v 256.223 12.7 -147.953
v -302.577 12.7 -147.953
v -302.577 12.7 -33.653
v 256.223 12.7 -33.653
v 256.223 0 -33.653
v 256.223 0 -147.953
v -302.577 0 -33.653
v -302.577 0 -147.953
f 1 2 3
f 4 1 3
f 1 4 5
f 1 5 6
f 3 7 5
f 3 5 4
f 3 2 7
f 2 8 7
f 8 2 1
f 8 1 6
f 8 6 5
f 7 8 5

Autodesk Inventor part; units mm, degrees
ref_plane "YZ Plane" through (0, 0, 0) normal (1, 0, 0) x (0, 1, 0)
ref_plane "XZ Plane" through (0, 0, 0) normal (0, 1, 0) x (-1, 0, 0)
ref_plane "XY Plane" through (0, 0, 0) normal (0, 0, 1) x (1, 0, 0)
sketch "Sketch1" plane through (0, 0, 0) normal (0, 1, 0) x (-1, 0, 0)
  line L0 (302.5767, -33.6533) -> (-154.6233, -33.6533)
  line L1 (-154.6233, -33.6533) -> (-154.6233, -147.9533)
  line L2 (-154.6233, -147.9533) -> (302.5767, -147.9533)
  line L3 (302.5767, -147.9533) -> (302.5767, -33.6533)
  line L4 (-154.6233, -147.9533) -> (-205.4233, -147.9533)
  line L5 (-205.4233, -147.9533) -> (-205.4233, -33.6533)
  line L6 (-205.4233, -33.6533) -> (-154.6233, -33.6533)
  line L7 (-154.6233, -33.6533) -> (-154.6233, -147.9533)
  point P0 (0, 0)
  dimension "d0" = 457.2
  dimension "d1" = 114.3
  dimension "d4" = 50.8
extrude "Extrusion1" add sketch "Sketch1" along normal blind 12.7 contours L3 L2 L1 L0
sketch "Sketch2" plane through (154.6233, 0, -33.6533) normal (1, 0, 0) x (0, 0, -1)
  line L0 (0, 12.7) -> (114.3, 12.7) projected
  line L1 (0, 12.7) -> (114.3, 12.7)
  line L2 (114.3, 12.7) -> (114.3, 0)
  line L3 (114.3, 0) -> (0, 0)
  line L4 (0, 0) -> (0, 12.7)
  point P0 (-33.6533, 0)
extrude "Extrusion2" add sketch "Sketch2" along normal blind 50.8
sketch "Sketch3" plane through (205.4233, 0, -33.6533) normal (1, 0, 0) x (0, 0, -1)
  line L0 (114.3, 12.7) -> (0, 12.7) projected
  line L1 (0, 12.7) -> (114.3, 12.7)
  line L2 (114.3, 12.7) -> (114.3, 0)
  line L3 (114.3, 0) -> (0, 0)
  line L4 (0, 0) -> (0, 12.7)
  point P0 (-33.6533, 0)
extrude "Extrusion3" add sketch "Sketch3" along normal blind 50.8
properties part number "Control pipe holder"
